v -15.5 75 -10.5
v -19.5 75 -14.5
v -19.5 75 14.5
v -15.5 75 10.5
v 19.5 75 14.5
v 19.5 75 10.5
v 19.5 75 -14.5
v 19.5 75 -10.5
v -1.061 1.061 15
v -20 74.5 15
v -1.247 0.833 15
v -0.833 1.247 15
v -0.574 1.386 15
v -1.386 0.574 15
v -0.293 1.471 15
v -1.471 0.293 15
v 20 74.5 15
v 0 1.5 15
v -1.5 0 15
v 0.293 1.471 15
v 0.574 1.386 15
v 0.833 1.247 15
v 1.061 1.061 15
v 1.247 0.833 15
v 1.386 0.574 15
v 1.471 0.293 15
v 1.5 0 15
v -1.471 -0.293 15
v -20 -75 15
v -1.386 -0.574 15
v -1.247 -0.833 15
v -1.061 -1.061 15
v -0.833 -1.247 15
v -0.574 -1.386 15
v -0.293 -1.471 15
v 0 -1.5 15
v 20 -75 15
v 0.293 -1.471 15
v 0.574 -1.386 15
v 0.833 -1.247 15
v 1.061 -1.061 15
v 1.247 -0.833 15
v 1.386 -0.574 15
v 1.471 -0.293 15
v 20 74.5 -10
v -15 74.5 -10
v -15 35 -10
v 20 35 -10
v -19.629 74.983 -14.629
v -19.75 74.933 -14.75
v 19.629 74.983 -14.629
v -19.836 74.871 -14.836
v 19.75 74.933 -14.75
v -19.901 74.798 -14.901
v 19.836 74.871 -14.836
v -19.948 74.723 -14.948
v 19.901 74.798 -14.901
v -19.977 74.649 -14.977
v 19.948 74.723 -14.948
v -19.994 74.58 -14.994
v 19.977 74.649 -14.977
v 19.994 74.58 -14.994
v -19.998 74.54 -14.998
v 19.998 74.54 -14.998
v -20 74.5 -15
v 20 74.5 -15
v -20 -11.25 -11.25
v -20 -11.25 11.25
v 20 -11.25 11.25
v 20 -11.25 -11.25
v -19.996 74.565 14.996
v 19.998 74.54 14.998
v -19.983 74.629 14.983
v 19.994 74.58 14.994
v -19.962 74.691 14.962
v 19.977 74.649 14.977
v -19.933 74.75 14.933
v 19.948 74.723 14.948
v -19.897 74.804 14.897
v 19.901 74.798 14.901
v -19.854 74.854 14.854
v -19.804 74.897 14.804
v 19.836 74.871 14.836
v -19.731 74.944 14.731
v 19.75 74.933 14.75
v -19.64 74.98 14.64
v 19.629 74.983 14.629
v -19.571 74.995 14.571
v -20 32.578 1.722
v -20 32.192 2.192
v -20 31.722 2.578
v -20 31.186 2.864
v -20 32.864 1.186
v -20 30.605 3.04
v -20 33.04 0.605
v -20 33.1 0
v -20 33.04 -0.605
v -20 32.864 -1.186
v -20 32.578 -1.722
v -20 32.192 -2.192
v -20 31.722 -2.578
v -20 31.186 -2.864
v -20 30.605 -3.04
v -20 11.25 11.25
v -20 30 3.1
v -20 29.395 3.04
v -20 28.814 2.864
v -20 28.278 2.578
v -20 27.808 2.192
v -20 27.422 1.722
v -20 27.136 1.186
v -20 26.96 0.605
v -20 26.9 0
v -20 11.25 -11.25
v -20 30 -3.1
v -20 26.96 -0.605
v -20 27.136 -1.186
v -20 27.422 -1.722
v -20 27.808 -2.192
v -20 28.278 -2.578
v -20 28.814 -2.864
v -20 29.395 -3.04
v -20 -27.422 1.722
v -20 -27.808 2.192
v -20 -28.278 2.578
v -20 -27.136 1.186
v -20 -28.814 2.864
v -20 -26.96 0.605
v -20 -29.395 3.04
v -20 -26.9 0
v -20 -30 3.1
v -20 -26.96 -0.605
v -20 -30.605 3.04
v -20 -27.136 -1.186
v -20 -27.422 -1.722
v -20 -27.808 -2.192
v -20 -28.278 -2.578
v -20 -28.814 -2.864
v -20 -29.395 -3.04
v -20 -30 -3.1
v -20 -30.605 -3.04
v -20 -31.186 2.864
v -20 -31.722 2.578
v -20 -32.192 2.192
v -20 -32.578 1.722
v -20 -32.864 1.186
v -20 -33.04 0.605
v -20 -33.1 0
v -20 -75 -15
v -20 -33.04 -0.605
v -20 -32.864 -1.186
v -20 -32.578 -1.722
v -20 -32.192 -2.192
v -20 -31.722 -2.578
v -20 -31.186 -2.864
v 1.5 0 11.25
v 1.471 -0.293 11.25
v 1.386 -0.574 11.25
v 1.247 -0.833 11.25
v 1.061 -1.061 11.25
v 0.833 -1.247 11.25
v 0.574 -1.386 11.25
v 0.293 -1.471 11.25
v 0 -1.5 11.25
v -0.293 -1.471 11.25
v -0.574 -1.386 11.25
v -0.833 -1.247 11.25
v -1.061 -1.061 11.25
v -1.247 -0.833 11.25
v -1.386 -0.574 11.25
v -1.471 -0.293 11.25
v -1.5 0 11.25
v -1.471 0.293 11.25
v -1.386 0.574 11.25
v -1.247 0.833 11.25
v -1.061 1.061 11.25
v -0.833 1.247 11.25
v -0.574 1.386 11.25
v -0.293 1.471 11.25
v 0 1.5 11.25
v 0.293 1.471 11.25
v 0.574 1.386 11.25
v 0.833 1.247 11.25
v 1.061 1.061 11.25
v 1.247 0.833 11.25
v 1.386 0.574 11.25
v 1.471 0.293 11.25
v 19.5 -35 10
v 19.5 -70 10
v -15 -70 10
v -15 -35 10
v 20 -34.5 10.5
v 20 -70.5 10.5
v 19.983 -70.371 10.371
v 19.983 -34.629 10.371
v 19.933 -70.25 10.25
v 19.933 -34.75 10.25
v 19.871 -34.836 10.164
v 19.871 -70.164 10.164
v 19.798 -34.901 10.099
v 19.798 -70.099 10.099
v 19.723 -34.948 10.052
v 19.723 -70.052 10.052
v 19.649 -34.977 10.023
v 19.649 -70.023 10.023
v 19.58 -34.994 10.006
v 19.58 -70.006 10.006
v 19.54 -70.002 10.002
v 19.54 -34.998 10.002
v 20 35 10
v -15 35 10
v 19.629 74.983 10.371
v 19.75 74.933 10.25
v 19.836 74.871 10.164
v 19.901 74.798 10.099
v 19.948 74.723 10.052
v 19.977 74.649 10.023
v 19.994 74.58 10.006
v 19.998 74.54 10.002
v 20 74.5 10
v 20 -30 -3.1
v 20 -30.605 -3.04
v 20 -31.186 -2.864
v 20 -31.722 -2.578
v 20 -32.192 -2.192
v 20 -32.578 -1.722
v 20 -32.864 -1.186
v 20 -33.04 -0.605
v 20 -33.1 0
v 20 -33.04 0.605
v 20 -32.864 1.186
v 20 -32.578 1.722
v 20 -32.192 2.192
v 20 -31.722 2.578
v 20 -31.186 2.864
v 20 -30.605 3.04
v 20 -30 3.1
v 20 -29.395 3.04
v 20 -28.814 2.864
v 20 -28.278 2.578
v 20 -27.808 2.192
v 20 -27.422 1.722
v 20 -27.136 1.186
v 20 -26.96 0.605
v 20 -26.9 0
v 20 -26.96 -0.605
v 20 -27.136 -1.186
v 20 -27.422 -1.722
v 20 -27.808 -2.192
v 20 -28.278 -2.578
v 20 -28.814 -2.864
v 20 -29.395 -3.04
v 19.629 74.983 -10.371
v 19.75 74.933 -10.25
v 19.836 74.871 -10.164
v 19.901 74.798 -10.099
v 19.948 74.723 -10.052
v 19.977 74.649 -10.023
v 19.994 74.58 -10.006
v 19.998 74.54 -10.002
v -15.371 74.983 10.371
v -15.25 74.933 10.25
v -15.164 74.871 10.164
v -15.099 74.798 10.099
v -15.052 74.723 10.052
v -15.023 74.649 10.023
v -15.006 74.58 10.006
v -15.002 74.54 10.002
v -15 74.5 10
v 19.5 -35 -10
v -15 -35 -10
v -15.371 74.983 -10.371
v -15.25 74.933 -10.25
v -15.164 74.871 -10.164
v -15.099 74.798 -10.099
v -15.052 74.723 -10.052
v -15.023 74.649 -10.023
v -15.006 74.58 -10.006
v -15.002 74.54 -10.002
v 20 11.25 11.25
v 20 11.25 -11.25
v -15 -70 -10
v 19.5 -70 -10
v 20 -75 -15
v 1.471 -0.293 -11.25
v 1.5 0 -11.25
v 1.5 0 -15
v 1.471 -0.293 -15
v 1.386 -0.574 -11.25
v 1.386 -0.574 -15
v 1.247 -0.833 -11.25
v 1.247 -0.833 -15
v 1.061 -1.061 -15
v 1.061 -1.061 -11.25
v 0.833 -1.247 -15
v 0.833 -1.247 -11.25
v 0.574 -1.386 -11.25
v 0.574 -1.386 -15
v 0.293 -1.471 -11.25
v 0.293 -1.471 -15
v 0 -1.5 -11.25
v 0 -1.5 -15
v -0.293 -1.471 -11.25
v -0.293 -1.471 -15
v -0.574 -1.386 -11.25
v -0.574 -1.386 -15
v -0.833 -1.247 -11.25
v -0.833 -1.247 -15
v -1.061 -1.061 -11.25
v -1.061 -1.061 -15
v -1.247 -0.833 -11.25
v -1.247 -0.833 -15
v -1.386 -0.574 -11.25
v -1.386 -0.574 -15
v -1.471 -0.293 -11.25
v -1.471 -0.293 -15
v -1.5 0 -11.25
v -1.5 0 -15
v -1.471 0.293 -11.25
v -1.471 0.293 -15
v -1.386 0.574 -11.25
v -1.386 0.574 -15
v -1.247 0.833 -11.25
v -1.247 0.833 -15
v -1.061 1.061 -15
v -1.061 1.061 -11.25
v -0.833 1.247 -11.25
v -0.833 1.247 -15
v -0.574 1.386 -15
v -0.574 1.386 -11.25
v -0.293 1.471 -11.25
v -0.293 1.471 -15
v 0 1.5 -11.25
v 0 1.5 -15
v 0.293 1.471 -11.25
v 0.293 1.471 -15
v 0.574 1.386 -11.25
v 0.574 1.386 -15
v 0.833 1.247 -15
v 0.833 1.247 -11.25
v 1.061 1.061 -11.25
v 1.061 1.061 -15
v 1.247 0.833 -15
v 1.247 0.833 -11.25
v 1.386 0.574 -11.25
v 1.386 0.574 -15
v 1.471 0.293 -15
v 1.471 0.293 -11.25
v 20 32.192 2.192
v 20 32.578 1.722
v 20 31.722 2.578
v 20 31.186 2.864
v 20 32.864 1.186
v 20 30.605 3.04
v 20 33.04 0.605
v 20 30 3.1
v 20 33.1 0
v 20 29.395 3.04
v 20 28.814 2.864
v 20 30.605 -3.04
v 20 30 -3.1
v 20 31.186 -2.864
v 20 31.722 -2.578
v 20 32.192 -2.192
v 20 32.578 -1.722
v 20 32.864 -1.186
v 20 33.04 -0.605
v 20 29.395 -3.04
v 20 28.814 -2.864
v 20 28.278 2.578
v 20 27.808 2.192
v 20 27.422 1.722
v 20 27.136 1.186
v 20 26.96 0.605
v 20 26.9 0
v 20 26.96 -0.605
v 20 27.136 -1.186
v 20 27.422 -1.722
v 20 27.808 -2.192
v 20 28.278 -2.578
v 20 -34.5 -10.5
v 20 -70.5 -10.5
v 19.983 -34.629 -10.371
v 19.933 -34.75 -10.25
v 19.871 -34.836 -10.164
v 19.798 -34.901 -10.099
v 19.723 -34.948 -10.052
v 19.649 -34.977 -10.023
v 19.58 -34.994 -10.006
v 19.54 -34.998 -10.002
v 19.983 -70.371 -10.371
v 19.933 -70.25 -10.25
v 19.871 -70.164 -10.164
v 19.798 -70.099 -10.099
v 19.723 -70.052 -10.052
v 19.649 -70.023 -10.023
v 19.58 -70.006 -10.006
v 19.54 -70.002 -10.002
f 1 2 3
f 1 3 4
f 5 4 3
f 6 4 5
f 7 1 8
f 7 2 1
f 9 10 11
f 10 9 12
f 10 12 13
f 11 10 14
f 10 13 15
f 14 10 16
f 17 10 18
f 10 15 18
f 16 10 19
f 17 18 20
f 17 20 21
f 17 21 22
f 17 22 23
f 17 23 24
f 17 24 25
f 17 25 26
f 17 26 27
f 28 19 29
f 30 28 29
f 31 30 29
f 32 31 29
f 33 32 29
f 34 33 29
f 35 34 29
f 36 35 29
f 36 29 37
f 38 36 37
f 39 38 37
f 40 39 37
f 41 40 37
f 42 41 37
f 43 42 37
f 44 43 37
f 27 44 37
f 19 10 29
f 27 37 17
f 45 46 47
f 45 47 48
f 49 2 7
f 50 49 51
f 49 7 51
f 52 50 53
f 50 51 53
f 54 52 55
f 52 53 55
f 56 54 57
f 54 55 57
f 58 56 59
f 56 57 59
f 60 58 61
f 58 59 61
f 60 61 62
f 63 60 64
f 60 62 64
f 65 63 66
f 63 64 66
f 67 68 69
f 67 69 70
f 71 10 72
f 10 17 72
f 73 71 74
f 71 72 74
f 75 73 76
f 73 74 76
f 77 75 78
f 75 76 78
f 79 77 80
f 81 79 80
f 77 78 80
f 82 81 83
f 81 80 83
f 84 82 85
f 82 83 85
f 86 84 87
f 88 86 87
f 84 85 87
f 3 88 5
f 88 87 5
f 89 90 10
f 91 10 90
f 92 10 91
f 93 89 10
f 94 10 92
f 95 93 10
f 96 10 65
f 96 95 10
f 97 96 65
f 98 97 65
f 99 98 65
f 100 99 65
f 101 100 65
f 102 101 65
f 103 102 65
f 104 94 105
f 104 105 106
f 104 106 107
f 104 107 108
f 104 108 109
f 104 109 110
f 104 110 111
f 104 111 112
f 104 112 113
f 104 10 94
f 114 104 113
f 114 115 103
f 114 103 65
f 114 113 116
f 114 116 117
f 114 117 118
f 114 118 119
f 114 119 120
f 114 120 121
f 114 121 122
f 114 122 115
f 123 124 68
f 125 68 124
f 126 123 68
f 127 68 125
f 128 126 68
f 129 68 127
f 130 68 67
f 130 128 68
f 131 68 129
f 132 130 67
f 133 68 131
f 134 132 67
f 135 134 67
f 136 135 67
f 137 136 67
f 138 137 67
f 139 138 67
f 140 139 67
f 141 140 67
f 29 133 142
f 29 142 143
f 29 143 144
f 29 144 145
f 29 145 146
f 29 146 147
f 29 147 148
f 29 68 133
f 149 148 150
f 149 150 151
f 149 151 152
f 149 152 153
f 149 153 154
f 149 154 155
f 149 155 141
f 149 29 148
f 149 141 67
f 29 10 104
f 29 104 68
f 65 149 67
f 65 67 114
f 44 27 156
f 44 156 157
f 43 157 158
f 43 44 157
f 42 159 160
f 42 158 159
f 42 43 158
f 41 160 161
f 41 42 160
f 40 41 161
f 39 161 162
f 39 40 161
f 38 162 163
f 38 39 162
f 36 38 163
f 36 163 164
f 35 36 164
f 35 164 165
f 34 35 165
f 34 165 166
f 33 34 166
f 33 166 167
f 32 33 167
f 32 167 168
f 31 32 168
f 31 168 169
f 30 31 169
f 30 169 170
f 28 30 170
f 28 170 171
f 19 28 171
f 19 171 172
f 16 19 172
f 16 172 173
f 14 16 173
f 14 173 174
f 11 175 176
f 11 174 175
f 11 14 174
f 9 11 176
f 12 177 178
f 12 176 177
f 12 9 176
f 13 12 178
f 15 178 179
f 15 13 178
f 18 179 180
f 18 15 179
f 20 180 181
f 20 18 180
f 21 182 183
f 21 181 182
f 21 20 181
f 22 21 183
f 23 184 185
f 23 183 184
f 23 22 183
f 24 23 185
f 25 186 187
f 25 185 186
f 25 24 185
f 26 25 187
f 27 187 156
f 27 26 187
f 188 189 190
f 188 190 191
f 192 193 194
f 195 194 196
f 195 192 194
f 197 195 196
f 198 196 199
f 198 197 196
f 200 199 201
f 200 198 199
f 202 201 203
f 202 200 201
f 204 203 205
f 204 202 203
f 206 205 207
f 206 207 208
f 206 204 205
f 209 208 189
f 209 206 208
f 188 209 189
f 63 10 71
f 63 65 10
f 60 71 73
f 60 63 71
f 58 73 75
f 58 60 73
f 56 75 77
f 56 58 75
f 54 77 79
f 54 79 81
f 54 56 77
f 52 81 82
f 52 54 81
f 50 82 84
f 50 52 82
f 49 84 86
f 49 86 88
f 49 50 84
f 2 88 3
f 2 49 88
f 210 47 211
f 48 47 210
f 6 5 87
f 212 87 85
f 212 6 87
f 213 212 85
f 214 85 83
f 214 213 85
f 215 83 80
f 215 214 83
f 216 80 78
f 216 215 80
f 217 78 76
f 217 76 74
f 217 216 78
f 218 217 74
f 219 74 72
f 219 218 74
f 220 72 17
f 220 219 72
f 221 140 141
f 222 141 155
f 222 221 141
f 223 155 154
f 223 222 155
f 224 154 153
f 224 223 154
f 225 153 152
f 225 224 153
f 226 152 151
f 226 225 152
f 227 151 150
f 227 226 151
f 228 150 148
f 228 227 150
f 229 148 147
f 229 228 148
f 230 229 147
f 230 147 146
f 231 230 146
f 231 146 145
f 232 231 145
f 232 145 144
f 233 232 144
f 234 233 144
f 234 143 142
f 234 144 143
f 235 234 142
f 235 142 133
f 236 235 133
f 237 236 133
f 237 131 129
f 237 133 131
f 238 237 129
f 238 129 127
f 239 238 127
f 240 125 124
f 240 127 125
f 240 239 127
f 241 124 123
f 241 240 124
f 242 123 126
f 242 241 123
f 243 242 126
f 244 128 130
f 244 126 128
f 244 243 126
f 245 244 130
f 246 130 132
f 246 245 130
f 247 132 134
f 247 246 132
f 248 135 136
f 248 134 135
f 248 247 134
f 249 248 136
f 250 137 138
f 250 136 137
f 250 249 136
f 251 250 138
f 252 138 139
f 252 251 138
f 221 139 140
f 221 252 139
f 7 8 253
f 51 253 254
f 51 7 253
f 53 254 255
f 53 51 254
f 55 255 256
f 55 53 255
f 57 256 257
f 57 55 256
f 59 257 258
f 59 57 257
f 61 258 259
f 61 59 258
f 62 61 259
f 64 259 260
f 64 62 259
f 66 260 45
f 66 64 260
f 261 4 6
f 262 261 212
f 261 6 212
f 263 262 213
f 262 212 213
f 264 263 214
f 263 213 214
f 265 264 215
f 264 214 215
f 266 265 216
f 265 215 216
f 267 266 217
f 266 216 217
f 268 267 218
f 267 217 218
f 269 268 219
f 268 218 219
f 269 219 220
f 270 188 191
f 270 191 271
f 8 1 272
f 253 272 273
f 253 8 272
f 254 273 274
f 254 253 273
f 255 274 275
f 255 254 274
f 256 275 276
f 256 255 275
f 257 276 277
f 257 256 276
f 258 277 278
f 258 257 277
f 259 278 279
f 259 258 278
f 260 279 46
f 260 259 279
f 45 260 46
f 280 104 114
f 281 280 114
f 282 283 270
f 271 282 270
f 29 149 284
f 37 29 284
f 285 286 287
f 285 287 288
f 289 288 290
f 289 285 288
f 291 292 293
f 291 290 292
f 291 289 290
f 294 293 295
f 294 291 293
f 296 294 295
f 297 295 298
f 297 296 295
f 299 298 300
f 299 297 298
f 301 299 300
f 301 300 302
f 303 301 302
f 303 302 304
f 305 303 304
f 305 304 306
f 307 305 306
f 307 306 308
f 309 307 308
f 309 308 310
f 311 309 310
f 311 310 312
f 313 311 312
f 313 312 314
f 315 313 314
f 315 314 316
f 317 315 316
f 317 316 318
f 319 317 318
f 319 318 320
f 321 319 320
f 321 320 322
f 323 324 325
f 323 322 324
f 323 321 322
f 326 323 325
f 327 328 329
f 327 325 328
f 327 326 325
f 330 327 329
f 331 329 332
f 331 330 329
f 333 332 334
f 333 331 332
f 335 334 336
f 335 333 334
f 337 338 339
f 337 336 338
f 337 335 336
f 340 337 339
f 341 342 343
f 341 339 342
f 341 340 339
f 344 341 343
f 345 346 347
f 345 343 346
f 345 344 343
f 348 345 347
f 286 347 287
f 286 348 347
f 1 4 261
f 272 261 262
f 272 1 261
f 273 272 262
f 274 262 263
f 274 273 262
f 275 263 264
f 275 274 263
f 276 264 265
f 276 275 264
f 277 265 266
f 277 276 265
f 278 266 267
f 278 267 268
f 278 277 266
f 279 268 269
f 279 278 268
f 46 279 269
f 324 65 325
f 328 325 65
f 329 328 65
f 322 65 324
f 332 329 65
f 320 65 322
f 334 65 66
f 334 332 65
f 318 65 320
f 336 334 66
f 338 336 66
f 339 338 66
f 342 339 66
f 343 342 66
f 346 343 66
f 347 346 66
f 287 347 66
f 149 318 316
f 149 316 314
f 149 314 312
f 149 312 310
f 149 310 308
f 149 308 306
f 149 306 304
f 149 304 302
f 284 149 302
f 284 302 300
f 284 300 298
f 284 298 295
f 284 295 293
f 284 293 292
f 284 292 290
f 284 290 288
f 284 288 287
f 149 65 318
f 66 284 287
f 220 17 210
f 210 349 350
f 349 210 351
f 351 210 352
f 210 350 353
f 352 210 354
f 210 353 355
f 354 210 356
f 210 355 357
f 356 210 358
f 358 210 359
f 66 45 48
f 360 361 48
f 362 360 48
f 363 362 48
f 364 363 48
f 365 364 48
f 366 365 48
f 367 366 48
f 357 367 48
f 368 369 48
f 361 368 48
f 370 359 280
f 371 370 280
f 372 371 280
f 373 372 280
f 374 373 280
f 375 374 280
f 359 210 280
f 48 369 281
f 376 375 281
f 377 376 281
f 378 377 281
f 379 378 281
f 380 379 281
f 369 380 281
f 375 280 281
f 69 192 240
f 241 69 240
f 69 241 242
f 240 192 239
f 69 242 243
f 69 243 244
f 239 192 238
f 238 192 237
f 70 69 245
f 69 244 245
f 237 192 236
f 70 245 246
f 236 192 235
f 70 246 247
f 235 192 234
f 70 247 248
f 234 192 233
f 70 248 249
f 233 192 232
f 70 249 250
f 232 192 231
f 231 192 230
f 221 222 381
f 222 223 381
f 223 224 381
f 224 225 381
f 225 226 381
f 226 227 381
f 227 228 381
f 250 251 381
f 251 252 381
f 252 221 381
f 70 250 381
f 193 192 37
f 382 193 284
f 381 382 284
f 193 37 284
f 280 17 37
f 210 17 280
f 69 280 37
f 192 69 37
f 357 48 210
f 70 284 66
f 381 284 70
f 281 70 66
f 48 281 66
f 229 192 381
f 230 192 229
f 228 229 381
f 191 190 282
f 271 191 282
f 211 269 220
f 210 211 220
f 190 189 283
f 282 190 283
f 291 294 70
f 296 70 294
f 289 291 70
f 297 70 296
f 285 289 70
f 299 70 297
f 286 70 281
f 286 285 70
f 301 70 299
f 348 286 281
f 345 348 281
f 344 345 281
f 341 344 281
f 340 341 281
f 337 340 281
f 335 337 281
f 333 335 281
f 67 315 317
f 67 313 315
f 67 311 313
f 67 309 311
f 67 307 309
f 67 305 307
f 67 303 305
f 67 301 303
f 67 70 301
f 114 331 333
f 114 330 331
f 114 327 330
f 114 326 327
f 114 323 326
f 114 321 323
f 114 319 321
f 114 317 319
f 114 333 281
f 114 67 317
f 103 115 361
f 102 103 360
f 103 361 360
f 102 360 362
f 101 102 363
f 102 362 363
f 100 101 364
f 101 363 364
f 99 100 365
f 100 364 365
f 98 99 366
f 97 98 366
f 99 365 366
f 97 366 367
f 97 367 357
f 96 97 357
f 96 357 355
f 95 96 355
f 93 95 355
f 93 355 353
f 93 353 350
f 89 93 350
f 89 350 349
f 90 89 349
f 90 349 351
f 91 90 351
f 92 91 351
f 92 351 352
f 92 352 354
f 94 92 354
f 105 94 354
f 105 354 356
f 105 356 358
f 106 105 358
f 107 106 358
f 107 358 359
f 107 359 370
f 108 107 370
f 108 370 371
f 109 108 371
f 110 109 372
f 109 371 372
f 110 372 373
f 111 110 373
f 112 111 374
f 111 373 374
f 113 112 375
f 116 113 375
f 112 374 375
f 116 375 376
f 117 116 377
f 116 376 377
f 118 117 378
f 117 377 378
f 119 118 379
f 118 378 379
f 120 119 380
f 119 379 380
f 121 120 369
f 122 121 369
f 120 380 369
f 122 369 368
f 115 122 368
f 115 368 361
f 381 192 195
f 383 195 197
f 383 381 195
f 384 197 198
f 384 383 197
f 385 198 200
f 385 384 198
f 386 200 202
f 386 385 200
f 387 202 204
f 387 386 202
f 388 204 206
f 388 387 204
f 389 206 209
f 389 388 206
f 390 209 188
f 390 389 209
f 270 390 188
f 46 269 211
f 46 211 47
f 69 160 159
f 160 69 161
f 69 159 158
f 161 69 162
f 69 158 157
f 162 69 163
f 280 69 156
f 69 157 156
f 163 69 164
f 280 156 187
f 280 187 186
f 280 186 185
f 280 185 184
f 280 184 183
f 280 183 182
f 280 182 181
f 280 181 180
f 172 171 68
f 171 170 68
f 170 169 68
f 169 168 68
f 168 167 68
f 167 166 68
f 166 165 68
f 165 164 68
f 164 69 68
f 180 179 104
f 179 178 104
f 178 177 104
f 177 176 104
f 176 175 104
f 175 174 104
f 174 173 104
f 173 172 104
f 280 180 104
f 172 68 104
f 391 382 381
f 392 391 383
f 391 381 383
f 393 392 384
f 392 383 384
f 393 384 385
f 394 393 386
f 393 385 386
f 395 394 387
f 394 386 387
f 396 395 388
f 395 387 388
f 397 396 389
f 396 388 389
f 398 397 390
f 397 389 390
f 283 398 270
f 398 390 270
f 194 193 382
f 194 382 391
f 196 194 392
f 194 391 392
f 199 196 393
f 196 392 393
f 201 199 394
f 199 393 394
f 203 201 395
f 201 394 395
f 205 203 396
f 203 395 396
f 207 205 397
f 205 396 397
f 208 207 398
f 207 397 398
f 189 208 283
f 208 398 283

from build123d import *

# Parameters (mm, degrees)
BOSS_EXTRUDE1_DEPTH      = 75
BOSS_EXTRUDE1_DEPTH_BACK = 75
SKETCH1_W                = 40
SKETCH1_H                = 30
SKETCH3_R                = 3.1
CUT_EXTRUDE1_DEPTH       = 150
CUT_EXTRUDE2_DEPTH       = 150
CUT_EXTRUDE2_DEPTH_BACK  = 150
SKETCH4_W                = 22.5
SKETCH4_H                = 22.5
SKETCH7_W                = 58.590655802
SKETCH7_H                = 20
CUT_EXTRUDE5_DEPTH       = 40
SKETCH8_W                = 20
SKETCH8_H                = 35
CUT_EXTRUDE6_DEPTH       = 35
FILLET2_R                = 0.5
FILLET3_R                = 0.5
CUT_EXTRUDE7_DEPTH       = 102
CUT_EXTRUDE7_DEPTH_BACK  = 10
SKETCH6_R                = 1.5


with BuildPart() as part:
    # Sketch1 → Boss-Extrude1 (new, two sides: drawn at the far end of the back side and taken through both)
    with BuildSketch(Plane(origin=(0, 0, 0), x_dir=(1, 0, 0), z_dir=(0, 1, 0)).offset(-BOSS_EXTRUDE1_DEPTH_BACK)):
        Rectangle(SKETCH1_W, SKETCH1_H)
    extrude(amount=BOSS_EXTRUDE1_DEPTH + BOSS_EXTRUDE1_DEPTH_BACK)

    # Sketch3 → Cut-Extrude1 (cut)
    with BuildSketch(Plane(origin=(20, 0, 0), x_dir=(0, 0, -1), z_dir=(1, 0, 0))):
        with Locations((0, 30)):
            Circle(SKETCH3_R)
    cut_extrude1 = extrude(amount=-CUT_EXTRUDE1_DEPTH, mode=Mode.SUBTRACT)

    # Mirror1: Cut-Extrude1 across plane
    add(cut_extrude1.mirror(Plane.ZX), mode=Mode.SUBTRACT)

    # Sketch4 → Cut-Extrude2 (cut, two sides: drawn at the far end of the back side and taken through both)
    with BuildSketch(Plane(origin=(0, 0, 0), x_dir=(0, 0, -1), z_dir=(1, 0, 0)).offset(-CUT_EXTRUDE2_DEPTH_BACK)):
        Rectangle(SKETCH4_W, SKETCH4_H)
    extrude(amount=CUT_EXTRUDE2_DEPTH + CUT_EXTRUDE2_DEPTH_BACK, mode=Mode.SUBTRACT)

    # Sketch7 → Cut-Extrude5 (cut)
    with BuildSketch(Plane(origin=(0, 75, 0), x_dir=(1, 0, 0), z_dir=(0, 1, 0))):
        with Locations((14.295327901, 0)):
            Rectangle(SKETCH7_W, SKETCH7_H)
    extrude(amount=-CUT_EXTRUDE5_DEPTH, mode=Mode.SUBTRACT)

    # Sketch8 → Cut-Extrude6 (cut)
    with BuildSketch(Plane(origin=(20, 0, 0), x_dir=(0, 0, -1), z_dir=(1, 0, 0))):
        with Locations((0, -52.5)):
            Rectangle(SKETCH8_W, SKETCH8_H)
    extrude(amount=-CUT_EXTRUDE6_DEPTH, mode=Mode.SUBTRACT)

    # Fillet2
    fillet2_edges = [part.edges().sort_by_distance(p)[0] for p in [
        (20, 75, -12.5),
        (2.5, 75, -10),
        (-15, 75, 0),
        (2.5, 75, 10),
        (20, 75, 12.5),
        (0, 75, -15),
        (-20, 75, 0),
        (0, 75, 15),
    ]]
    fillet(fillet2_edges, radius=FILLET2_R)

    # Fillet3
    fillet3_edges = [part.edges().sort_by_distance(p)[0] for p in [
        (20, -70, 0),
        (20, -52.5, 10),
        (20, -35, 0),
        (20, -52.5, -10),
    ]]
    fillet(fillet3_edges, radius=FILLET3_R)

    # Sketch6 → Cut-Extrude7 (cut, two sides: drawn at the far end of the back side and taken through both)
    with BuildSketch(Plane(origin=(0, 0, 11.25), x_dir=(-1, 0, 0), z_dir=(0, 0, -1)).offset(-CUT_EXTRUDE7_DEPTH_BACK)):
        Circle(SKETCH6_R)
    extrude(amount=CUT_EXTRUDE7_DEPTH + CUT_EXTRUDE7_DEPTH_BACK, mode=Mode.SUBTRACT)


solid = part.part
